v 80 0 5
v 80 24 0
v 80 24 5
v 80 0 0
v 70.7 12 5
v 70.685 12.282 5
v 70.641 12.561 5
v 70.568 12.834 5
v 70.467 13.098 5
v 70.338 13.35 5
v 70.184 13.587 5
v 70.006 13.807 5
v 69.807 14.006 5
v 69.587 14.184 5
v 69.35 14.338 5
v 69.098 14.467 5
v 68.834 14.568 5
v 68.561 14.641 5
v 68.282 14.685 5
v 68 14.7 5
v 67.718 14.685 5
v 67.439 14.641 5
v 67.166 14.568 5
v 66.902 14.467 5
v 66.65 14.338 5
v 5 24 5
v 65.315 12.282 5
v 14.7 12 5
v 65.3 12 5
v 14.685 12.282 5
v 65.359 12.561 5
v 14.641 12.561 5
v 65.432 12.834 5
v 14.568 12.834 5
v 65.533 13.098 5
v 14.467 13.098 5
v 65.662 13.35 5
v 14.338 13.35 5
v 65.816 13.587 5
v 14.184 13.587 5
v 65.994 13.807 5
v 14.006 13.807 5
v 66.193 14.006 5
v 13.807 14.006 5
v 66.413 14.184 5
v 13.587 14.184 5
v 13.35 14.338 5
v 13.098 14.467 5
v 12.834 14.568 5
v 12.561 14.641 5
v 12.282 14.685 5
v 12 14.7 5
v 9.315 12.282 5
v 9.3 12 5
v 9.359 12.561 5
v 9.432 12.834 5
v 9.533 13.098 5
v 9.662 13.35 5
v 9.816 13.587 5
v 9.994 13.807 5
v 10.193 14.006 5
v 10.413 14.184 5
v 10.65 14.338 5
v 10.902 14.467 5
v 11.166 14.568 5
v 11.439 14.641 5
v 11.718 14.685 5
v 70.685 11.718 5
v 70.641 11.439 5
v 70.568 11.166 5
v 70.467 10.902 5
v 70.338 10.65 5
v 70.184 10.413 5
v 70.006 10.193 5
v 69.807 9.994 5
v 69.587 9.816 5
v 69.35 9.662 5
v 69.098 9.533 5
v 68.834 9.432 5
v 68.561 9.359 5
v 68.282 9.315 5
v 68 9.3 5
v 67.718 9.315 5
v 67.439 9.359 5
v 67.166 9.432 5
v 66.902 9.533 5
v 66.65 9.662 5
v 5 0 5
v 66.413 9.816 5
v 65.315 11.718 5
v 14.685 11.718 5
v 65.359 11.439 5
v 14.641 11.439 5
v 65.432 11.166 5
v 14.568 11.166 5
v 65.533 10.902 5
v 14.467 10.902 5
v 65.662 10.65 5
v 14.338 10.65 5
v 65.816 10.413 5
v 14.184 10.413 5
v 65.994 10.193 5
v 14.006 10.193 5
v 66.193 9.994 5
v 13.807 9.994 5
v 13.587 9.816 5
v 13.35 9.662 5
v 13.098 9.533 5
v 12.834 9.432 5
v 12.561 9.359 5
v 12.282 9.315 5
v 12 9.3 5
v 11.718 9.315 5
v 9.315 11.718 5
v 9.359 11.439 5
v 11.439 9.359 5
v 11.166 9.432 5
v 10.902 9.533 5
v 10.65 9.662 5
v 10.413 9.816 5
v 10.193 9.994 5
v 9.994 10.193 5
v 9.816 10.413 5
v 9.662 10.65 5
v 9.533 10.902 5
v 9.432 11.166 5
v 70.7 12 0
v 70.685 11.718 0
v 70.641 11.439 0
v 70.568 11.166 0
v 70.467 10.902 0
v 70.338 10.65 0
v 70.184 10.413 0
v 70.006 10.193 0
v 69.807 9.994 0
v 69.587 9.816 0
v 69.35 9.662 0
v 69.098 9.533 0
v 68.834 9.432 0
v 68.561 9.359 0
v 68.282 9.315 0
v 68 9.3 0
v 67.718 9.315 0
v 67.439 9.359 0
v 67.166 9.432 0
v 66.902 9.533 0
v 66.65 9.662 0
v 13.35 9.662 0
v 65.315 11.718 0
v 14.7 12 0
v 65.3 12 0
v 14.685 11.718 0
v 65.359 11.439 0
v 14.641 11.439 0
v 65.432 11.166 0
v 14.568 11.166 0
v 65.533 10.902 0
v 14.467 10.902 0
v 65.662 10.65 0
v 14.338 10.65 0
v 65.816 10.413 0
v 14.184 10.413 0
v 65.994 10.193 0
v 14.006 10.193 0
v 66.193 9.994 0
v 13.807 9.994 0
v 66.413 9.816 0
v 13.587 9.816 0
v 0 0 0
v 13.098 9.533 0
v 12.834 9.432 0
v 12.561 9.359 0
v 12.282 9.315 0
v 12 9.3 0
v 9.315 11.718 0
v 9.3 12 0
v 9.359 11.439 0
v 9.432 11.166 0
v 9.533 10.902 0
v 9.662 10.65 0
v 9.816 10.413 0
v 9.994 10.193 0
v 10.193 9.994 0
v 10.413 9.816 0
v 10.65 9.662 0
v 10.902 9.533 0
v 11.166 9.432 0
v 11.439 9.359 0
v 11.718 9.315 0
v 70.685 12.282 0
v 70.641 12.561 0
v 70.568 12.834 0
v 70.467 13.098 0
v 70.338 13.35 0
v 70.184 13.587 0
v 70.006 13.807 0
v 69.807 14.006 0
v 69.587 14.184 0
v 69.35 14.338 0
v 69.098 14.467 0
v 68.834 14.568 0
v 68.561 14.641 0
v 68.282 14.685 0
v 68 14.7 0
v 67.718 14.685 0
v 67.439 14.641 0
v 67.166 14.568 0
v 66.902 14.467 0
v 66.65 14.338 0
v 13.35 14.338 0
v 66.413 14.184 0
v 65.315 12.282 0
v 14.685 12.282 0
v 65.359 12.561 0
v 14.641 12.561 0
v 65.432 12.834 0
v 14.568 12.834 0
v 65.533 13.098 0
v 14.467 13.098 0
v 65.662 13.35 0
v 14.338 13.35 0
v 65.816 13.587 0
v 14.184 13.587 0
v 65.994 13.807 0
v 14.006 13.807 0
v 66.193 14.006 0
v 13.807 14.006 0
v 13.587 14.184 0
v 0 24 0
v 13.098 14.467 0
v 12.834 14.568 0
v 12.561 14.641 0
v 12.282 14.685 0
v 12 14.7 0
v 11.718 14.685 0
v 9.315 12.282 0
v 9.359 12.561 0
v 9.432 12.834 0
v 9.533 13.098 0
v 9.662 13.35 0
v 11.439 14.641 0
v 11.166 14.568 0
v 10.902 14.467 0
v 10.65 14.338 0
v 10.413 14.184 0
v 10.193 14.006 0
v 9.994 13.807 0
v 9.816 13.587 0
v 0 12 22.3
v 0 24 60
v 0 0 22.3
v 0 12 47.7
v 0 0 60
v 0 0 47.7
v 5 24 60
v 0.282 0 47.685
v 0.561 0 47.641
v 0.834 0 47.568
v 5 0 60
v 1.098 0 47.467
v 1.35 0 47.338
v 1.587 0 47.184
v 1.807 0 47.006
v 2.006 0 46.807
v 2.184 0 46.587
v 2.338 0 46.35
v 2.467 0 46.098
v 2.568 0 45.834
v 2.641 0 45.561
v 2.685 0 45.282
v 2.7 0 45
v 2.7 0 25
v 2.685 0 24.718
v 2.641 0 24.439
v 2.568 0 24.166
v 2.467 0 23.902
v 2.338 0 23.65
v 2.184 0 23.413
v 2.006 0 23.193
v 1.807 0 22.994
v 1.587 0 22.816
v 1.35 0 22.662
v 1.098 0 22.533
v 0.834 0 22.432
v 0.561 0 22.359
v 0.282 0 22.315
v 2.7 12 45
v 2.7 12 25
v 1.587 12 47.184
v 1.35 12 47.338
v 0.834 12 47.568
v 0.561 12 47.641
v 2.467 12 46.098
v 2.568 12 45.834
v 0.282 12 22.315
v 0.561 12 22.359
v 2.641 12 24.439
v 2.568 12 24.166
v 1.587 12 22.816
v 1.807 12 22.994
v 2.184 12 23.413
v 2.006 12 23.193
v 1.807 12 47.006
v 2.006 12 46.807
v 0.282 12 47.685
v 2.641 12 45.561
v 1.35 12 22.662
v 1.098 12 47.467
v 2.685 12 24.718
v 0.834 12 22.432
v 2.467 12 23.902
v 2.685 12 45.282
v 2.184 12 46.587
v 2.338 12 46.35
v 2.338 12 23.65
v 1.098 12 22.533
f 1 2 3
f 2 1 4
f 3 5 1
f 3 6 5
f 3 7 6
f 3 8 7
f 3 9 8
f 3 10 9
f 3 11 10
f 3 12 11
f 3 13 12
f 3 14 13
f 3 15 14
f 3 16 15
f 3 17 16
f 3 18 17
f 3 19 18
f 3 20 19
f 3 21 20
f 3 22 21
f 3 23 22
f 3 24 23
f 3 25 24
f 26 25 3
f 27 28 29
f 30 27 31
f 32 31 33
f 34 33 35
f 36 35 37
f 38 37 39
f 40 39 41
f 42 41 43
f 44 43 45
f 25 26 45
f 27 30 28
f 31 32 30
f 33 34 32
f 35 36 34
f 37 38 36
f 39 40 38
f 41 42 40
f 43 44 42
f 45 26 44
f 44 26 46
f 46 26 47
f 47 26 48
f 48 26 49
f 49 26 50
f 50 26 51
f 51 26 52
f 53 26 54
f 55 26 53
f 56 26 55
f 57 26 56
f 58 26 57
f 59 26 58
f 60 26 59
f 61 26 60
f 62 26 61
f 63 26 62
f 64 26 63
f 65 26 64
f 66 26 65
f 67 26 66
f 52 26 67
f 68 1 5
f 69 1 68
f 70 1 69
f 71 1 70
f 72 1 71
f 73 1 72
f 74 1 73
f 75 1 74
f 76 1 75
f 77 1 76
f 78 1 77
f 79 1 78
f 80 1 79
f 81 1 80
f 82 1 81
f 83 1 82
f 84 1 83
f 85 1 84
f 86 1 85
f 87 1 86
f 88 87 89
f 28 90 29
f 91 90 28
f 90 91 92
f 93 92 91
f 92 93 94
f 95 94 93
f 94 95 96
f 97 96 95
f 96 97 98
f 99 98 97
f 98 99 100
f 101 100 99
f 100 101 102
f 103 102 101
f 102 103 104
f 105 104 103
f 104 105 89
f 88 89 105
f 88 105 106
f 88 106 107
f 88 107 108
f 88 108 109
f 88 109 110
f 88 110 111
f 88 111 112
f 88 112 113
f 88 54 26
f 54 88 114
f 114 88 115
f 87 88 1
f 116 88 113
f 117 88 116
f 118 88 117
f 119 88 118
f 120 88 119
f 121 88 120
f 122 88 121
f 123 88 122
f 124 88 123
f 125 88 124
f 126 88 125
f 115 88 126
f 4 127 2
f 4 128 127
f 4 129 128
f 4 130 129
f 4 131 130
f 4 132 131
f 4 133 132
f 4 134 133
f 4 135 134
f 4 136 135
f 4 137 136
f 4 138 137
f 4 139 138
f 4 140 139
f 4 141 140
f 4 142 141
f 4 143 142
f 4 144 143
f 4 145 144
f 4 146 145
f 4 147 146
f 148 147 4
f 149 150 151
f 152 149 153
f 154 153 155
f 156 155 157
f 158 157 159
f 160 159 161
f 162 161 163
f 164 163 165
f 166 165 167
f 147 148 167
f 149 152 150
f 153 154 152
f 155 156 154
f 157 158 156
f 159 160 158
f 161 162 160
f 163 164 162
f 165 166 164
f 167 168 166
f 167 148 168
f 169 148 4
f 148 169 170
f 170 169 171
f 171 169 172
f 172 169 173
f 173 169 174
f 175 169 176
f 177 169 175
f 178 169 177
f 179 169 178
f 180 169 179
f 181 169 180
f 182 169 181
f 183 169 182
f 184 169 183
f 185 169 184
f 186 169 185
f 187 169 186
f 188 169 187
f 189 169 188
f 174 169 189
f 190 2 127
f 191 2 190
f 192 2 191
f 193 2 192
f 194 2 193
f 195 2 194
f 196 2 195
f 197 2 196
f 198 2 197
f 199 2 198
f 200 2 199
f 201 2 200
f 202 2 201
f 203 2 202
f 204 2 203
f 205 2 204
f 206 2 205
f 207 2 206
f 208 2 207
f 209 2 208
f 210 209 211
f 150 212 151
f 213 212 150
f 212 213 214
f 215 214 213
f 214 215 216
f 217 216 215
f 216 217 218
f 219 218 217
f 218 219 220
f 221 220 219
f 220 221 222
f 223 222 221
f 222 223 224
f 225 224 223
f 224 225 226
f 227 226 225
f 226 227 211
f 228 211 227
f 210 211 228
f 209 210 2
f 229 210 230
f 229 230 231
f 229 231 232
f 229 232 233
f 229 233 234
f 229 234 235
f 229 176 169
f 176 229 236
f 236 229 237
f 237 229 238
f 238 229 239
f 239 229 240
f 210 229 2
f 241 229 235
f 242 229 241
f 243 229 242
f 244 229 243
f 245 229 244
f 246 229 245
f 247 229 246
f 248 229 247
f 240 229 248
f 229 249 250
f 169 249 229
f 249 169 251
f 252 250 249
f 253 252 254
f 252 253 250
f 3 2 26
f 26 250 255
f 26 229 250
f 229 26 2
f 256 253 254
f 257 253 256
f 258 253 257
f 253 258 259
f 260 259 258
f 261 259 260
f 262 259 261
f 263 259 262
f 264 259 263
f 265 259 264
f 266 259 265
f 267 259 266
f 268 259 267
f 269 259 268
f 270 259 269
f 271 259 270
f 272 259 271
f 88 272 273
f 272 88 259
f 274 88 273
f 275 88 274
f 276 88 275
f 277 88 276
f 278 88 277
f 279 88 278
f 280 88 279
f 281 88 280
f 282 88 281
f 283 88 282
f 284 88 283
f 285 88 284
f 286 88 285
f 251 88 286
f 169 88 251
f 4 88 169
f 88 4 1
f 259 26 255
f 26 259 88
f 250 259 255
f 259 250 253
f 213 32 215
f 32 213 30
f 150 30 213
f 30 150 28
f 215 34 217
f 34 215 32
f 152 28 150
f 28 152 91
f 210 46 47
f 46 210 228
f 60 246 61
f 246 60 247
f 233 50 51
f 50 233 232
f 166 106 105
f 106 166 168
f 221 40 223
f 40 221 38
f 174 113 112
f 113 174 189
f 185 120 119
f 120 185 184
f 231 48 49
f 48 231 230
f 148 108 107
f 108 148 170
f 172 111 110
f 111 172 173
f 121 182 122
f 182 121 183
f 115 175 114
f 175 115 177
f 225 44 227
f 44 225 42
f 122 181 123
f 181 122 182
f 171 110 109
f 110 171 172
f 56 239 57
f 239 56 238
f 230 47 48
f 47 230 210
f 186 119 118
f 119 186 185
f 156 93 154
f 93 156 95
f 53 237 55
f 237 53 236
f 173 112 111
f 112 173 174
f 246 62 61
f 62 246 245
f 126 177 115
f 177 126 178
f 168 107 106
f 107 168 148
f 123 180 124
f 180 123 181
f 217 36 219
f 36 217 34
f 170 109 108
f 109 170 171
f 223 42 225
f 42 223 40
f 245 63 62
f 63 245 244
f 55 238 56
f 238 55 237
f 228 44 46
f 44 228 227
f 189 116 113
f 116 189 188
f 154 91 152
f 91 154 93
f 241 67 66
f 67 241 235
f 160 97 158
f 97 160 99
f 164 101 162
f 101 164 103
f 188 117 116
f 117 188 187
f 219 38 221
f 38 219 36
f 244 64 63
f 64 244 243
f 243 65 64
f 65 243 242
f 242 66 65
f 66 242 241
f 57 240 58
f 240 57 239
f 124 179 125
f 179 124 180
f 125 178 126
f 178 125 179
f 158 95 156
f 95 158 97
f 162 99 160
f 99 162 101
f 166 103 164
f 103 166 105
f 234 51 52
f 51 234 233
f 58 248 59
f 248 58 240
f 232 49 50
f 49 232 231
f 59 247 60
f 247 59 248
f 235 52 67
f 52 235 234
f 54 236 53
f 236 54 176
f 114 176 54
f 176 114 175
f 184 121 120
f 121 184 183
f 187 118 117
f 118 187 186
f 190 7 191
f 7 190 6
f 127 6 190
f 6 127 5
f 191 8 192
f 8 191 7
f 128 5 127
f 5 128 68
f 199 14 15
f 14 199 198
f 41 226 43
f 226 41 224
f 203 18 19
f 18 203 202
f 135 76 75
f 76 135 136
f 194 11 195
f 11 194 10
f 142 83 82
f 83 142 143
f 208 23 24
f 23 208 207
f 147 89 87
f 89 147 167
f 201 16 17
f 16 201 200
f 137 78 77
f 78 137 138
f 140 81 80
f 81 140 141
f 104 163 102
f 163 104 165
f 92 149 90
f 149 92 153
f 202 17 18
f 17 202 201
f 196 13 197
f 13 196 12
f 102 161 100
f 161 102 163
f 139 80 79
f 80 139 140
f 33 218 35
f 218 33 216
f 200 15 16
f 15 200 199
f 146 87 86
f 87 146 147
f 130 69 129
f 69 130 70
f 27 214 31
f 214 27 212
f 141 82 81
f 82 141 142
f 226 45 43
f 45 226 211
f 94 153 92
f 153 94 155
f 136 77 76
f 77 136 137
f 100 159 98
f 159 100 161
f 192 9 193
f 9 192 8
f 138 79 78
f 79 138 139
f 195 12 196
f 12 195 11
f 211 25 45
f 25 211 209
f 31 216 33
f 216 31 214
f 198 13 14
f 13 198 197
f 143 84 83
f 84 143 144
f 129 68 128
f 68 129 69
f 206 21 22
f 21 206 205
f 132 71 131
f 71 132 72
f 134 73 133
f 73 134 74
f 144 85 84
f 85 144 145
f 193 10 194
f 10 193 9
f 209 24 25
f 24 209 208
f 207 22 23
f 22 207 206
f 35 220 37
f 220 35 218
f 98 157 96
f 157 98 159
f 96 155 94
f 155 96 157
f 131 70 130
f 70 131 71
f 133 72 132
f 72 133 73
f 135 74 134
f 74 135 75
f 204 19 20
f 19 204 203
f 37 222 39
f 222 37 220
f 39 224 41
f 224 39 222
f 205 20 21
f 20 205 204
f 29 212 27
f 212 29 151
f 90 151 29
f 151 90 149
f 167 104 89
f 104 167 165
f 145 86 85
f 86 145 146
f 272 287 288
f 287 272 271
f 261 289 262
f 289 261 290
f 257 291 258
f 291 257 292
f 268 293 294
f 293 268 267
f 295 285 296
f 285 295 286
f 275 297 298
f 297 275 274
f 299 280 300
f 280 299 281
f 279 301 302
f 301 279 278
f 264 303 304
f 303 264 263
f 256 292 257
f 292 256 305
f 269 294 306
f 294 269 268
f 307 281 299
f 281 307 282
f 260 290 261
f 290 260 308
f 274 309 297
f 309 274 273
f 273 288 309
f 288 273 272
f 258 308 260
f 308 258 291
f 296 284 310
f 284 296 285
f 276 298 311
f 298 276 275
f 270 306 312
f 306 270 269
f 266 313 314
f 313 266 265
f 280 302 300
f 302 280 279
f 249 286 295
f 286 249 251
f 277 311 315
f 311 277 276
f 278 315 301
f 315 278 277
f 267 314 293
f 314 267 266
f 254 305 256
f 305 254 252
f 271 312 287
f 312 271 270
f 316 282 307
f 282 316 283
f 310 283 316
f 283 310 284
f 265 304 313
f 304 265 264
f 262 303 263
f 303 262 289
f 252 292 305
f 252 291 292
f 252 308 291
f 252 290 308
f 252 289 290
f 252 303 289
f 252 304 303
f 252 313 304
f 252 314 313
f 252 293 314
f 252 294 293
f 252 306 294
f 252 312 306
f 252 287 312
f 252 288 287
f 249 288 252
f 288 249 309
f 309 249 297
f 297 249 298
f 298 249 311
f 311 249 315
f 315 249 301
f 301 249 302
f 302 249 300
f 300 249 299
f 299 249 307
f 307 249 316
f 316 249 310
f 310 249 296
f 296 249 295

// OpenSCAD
// Adjustable L bracket with upright slot.
$fn = 60;
eps = 0.02;
base_l = 80;
upright_h = 60;
width = 24;
thickness = 5;
slot_l = 20;
module vertical_slot() { hull() { translate([0,width/2,thickness+upright_h/2-slot_l/2]) rotate([90,0,0]) cylinder(d=5.4,h=width+2*eps); translate([0,width/2,thickness+upright_h/2+slot_l/2]) rotate([90,0,0]) cylinder(d=5.4,h=width+2*eps); } }
difference() {
    union() { cube([base_l,width,thickness]); cube([thickness,width,upright_h]); }
    for(x=[12,base_l-12]) translate([x,width/2,-eps]) cylinder(d=5.4,h=thickness+2*eps);
    vertical_slot();
}
